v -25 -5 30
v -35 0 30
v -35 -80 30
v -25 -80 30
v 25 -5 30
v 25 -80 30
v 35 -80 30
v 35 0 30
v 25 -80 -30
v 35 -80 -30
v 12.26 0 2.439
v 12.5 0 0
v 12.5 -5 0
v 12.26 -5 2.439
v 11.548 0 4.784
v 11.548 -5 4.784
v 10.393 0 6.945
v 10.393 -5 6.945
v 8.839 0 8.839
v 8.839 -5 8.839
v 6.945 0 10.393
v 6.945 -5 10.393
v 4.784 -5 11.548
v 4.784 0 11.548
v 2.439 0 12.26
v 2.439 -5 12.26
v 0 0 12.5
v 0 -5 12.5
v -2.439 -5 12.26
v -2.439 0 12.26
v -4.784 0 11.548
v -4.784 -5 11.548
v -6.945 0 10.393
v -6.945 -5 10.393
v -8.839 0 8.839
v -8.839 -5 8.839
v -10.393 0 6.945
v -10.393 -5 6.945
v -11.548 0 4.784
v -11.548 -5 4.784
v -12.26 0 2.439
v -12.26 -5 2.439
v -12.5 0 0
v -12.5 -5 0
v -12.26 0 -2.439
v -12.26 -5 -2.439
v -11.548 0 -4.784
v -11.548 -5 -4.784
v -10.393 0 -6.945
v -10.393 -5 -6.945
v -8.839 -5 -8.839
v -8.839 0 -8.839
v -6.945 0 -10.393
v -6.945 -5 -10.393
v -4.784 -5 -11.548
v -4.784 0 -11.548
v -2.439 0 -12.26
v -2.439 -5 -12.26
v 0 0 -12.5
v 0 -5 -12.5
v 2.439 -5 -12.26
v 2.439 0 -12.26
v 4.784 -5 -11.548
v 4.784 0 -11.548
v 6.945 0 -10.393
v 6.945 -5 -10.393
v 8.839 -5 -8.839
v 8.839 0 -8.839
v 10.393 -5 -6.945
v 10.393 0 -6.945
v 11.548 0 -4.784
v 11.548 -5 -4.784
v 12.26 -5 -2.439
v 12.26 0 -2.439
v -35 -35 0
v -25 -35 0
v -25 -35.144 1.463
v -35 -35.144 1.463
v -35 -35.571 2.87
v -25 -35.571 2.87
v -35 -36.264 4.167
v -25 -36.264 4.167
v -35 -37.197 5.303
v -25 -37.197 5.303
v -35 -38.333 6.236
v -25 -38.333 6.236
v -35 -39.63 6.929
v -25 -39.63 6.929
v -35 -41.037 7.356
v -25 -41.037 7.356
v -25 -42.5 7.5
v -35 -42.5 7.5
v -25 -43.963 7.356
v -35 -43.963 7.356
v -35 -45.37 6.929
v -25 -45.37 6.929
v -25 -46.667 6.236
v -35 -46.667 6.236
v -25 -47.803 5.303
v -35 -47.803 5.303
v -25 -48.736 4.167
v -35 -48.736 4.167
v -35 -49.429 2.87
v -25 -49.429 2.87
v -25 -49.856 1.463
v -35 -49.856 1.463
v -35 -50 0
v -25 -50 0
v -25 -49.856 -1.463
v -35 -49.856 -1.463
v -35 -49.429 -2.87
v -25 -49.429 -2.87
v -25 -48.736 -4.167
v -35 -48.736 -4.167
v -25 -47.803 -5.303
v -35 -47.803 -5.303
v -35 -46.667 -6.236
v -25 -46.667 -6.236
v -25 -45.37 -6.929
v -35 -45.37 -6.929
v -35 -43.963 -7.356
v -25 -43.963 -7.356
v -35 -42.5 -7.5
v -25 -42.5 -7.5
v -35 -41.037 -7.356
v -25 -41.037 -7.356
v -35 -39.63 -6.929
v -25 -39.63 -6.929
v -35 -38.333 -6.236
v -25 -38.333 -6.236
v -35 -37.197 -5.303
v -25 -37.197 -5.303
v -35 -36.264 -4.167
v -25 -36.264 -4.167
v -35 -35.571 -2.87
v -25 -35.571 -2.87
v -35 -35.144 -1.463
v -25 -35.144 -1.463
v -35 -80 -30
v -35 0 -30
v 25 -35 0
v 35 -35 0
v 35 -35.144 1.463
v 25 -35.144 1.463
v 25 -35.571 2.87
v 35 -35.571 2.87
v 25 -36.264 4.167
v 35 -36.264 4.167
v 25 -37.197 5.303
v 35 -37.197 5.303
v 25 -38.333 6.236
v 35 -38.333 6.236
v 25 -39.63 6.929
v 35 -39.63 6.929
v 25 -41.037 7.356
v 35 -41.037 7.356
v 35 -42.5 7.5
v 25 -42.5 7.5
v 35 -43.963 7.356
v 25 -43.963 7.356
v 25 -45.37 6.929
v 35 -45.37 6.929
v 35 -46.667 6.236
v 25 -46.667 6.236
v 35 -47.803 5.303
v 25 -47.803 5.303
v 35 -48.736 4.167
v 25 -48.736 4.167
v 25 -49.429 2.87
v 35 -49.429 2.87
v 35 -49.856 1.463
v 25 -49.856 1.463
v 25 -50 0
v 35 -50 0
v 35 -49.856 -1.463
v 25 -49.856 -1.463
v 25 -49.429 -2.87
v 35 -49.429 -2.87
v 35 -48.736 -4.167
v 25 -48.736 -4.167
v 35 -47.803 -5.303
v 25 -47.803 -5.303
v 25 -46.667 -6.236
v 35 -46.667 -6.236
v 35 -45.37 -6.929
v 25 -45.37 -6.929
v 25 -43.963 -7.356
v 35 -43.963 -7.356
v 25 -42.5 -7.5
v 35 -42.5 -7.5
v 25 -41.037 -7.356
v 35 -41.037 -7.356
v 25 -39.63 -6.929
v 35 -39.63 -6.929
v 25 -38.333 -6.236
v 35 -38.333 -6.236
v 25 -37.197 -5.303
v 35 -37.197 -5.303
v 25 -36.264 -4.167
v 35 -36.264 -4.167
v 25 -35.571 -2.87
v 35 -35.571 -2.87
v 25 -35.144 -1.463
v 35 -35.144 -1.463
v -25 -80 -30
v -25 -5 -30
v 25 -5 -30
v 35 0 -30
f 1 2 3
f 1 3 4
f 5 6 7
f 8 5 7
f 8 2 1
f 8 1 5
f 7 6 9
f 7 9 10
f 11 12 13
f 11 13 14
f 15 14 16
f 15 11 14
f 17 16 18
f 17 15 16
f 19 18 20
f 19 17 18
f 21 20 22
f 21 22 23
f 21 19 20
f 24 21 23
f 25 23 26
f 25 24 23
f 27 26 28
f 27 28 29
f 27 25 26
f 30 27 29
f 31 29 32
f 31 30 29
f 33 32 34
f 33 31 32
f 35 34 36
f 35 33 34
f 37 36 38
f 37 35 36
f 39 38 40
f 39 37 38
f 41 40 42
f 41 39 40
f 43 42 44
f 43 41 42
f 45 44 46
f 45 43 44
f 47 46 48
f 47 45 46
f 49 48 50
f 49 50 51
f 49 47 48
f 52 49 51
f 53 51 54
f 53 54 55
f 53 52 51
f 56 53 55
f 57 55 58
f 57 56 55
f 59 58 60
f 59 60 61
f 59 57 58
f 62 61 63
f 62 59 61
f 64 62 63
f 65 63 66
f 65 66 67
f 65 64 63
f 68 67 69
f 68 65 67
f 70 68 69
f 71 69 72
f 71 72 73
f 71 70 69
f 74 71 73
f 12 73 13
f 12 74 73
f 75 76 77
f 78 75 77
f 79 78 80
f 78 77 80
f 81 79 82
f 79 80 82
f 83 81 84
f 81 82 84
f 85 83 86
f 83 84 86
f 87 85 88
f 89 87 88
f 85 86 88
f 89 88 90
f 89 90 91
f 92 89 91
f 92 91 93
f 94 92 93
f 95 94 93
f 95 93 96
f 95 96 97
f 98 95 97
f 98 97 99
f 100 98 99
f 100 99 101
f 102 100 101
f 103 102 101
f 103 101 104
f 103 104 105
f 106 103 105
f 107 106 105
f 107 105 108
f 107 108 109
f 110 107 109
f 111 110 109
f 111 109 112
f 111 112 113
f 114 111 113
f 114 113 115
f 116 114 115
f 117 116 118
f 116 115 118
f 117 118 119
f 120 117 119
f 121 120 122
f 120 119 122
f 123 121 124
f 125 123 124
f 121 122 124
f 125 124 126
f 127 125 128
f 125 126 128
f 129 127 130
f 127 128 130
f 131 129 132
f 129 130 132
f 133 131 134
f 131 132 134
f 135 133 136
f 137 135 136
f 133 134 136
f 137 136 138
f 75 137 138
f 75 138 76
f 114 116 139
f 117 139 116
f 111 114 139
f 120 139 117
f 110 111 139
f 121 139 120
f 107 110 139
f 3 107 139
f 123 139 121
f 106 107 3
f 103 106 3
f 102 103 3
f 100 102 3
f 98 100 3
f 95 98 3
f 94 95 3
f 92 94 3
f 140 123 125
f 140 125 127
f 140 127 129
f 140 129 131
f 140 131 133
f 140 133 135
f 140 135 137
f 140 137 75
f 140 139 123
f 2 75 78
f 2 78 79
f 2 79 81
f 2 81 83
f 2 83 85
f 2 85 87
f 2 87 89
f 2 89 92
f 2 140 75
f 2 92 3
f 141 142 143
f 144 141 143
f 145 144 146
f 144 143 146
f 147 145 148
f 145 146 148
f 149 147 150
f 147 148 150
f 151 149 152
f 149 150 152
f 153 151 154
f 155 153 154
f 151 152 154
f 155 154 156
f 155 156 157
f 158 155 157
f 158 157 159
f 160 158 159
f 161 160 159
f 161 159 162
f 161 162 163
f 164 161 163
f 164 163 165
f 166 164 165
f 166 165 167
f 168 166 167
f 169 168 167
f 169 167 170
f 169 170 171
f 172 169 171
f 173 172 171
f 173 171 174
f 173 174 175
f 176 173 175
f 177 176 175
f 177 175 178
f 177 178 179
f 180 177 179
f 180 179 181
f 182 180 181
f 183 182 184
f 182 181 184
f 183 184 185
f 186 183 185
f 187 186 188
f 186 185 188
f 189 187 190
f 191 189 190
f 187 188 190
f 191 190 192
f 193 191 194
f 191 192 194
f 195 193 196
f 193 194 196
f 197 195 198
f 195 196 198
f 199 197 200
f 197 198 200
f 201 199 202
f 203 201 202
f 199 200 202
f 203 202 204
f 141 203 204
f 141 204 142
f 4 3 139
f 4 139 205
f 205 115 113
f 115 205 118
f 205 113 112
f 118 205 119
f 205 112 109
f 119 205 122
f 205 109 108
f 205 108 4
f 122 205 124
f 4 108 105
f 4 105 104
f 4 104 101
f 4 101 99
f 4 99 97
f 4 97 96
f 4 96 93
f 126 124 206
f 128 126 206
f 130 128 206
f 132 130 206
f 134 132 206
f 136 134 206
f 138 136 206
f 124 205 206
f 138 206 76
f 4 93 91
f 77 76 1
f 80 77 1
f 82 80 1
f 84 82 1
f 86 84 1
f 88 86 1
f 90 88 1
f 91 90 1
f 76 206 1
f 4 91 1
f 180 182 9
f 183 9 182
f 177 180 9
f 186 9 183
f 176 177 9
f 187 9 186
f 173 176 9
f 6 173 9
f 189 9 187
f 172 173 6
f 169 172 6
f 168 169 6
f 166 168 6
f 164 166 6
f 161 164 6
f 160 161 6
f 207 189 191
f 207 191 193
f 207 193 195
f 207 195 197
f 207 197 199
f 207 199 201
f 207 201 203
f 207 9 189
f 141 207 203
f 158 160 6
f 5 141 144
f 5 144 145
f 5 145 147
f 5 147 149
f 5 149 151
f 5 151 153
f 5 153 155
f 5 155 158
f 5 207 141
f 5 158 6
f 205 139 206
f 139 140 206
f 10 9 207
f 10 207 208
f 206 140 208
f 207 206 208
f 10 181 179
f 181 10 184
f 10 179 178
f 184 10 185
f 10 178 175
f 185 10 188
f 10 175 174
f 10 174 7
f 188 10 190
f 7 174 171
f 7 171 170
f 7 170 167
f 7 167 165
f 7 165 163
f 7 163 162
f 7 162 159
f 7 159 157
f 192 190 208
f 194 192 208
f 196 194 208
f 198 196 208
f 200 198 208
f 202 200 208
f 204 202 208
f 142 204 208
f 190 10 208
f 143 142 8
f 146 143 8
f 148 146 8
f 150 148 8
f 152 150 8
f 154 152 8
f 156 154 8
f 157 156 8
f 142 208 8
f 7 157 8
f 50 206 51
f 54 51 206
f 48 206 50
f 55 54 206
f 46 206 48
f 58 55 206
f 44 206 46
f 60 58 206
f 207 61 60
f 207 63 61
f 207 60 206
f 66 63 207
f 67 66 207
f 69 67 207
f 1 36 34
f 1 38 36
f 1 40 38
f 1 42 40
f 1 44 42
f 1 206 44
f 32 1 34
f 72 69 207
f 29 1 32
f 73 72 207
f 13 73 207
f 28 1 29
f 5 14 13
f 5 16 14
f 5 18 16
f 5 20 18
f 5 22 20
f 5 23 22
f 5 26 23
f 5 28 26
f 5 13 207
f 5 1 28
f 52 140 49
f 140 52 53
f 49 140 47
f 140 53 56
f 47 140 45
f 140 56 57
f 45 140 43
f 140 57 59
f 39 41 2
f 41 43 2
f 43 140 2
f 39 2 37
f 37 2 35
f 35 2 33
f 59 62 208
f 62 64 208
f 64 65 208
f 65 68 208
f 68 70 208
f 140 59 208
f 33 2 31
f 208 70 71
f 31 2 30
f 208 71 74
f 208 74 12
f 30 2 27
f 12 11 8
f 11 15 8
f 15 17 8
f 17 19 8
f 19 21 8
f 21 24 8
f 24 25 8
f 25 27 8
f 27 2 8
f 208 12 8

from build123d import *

# Parameters (mm, degrees)
F0_W     = 70
F0_H     = 60
F0_R     = 12.5
F1_DEPTH = 5
F2_W     = 10
F2_H     = 60
F3_DEPTH = 75
F4_R     = 7.5
F5_DEPTH = 70.001


with BuildPart() as f1:
    # F0 (on Front) → F1 (new body)
    with BuildSketch(Plane.XZ):
        Rectangle(F0_W, F0_H)
        Circle(F0_R, mode=Mode.SUBTRACT)
    extrude(amount=F1_DEPTH)

    # F2 (on face) → F3 (join)
    with BuildSketch(Plane.XZ.offset(5)):
        with Locations((-30, 0)):
            Rectangle(F2_W, F2_H)
        with Locations((30, 0)):
            Rectangle(F2_W, F2_H)
    extrude(amount=F3_DEPTH)

    # F4 (on face) → F5 (cut, through all)
    with BuildSketch(Plane.YZ.offset(35)):
        with Locations((-42.5, 0)):
            Circle(F4_R)
    extrude(amount=-F5_DEPTH, mode=Mode.SUBTRACT)


solid = f1.part
